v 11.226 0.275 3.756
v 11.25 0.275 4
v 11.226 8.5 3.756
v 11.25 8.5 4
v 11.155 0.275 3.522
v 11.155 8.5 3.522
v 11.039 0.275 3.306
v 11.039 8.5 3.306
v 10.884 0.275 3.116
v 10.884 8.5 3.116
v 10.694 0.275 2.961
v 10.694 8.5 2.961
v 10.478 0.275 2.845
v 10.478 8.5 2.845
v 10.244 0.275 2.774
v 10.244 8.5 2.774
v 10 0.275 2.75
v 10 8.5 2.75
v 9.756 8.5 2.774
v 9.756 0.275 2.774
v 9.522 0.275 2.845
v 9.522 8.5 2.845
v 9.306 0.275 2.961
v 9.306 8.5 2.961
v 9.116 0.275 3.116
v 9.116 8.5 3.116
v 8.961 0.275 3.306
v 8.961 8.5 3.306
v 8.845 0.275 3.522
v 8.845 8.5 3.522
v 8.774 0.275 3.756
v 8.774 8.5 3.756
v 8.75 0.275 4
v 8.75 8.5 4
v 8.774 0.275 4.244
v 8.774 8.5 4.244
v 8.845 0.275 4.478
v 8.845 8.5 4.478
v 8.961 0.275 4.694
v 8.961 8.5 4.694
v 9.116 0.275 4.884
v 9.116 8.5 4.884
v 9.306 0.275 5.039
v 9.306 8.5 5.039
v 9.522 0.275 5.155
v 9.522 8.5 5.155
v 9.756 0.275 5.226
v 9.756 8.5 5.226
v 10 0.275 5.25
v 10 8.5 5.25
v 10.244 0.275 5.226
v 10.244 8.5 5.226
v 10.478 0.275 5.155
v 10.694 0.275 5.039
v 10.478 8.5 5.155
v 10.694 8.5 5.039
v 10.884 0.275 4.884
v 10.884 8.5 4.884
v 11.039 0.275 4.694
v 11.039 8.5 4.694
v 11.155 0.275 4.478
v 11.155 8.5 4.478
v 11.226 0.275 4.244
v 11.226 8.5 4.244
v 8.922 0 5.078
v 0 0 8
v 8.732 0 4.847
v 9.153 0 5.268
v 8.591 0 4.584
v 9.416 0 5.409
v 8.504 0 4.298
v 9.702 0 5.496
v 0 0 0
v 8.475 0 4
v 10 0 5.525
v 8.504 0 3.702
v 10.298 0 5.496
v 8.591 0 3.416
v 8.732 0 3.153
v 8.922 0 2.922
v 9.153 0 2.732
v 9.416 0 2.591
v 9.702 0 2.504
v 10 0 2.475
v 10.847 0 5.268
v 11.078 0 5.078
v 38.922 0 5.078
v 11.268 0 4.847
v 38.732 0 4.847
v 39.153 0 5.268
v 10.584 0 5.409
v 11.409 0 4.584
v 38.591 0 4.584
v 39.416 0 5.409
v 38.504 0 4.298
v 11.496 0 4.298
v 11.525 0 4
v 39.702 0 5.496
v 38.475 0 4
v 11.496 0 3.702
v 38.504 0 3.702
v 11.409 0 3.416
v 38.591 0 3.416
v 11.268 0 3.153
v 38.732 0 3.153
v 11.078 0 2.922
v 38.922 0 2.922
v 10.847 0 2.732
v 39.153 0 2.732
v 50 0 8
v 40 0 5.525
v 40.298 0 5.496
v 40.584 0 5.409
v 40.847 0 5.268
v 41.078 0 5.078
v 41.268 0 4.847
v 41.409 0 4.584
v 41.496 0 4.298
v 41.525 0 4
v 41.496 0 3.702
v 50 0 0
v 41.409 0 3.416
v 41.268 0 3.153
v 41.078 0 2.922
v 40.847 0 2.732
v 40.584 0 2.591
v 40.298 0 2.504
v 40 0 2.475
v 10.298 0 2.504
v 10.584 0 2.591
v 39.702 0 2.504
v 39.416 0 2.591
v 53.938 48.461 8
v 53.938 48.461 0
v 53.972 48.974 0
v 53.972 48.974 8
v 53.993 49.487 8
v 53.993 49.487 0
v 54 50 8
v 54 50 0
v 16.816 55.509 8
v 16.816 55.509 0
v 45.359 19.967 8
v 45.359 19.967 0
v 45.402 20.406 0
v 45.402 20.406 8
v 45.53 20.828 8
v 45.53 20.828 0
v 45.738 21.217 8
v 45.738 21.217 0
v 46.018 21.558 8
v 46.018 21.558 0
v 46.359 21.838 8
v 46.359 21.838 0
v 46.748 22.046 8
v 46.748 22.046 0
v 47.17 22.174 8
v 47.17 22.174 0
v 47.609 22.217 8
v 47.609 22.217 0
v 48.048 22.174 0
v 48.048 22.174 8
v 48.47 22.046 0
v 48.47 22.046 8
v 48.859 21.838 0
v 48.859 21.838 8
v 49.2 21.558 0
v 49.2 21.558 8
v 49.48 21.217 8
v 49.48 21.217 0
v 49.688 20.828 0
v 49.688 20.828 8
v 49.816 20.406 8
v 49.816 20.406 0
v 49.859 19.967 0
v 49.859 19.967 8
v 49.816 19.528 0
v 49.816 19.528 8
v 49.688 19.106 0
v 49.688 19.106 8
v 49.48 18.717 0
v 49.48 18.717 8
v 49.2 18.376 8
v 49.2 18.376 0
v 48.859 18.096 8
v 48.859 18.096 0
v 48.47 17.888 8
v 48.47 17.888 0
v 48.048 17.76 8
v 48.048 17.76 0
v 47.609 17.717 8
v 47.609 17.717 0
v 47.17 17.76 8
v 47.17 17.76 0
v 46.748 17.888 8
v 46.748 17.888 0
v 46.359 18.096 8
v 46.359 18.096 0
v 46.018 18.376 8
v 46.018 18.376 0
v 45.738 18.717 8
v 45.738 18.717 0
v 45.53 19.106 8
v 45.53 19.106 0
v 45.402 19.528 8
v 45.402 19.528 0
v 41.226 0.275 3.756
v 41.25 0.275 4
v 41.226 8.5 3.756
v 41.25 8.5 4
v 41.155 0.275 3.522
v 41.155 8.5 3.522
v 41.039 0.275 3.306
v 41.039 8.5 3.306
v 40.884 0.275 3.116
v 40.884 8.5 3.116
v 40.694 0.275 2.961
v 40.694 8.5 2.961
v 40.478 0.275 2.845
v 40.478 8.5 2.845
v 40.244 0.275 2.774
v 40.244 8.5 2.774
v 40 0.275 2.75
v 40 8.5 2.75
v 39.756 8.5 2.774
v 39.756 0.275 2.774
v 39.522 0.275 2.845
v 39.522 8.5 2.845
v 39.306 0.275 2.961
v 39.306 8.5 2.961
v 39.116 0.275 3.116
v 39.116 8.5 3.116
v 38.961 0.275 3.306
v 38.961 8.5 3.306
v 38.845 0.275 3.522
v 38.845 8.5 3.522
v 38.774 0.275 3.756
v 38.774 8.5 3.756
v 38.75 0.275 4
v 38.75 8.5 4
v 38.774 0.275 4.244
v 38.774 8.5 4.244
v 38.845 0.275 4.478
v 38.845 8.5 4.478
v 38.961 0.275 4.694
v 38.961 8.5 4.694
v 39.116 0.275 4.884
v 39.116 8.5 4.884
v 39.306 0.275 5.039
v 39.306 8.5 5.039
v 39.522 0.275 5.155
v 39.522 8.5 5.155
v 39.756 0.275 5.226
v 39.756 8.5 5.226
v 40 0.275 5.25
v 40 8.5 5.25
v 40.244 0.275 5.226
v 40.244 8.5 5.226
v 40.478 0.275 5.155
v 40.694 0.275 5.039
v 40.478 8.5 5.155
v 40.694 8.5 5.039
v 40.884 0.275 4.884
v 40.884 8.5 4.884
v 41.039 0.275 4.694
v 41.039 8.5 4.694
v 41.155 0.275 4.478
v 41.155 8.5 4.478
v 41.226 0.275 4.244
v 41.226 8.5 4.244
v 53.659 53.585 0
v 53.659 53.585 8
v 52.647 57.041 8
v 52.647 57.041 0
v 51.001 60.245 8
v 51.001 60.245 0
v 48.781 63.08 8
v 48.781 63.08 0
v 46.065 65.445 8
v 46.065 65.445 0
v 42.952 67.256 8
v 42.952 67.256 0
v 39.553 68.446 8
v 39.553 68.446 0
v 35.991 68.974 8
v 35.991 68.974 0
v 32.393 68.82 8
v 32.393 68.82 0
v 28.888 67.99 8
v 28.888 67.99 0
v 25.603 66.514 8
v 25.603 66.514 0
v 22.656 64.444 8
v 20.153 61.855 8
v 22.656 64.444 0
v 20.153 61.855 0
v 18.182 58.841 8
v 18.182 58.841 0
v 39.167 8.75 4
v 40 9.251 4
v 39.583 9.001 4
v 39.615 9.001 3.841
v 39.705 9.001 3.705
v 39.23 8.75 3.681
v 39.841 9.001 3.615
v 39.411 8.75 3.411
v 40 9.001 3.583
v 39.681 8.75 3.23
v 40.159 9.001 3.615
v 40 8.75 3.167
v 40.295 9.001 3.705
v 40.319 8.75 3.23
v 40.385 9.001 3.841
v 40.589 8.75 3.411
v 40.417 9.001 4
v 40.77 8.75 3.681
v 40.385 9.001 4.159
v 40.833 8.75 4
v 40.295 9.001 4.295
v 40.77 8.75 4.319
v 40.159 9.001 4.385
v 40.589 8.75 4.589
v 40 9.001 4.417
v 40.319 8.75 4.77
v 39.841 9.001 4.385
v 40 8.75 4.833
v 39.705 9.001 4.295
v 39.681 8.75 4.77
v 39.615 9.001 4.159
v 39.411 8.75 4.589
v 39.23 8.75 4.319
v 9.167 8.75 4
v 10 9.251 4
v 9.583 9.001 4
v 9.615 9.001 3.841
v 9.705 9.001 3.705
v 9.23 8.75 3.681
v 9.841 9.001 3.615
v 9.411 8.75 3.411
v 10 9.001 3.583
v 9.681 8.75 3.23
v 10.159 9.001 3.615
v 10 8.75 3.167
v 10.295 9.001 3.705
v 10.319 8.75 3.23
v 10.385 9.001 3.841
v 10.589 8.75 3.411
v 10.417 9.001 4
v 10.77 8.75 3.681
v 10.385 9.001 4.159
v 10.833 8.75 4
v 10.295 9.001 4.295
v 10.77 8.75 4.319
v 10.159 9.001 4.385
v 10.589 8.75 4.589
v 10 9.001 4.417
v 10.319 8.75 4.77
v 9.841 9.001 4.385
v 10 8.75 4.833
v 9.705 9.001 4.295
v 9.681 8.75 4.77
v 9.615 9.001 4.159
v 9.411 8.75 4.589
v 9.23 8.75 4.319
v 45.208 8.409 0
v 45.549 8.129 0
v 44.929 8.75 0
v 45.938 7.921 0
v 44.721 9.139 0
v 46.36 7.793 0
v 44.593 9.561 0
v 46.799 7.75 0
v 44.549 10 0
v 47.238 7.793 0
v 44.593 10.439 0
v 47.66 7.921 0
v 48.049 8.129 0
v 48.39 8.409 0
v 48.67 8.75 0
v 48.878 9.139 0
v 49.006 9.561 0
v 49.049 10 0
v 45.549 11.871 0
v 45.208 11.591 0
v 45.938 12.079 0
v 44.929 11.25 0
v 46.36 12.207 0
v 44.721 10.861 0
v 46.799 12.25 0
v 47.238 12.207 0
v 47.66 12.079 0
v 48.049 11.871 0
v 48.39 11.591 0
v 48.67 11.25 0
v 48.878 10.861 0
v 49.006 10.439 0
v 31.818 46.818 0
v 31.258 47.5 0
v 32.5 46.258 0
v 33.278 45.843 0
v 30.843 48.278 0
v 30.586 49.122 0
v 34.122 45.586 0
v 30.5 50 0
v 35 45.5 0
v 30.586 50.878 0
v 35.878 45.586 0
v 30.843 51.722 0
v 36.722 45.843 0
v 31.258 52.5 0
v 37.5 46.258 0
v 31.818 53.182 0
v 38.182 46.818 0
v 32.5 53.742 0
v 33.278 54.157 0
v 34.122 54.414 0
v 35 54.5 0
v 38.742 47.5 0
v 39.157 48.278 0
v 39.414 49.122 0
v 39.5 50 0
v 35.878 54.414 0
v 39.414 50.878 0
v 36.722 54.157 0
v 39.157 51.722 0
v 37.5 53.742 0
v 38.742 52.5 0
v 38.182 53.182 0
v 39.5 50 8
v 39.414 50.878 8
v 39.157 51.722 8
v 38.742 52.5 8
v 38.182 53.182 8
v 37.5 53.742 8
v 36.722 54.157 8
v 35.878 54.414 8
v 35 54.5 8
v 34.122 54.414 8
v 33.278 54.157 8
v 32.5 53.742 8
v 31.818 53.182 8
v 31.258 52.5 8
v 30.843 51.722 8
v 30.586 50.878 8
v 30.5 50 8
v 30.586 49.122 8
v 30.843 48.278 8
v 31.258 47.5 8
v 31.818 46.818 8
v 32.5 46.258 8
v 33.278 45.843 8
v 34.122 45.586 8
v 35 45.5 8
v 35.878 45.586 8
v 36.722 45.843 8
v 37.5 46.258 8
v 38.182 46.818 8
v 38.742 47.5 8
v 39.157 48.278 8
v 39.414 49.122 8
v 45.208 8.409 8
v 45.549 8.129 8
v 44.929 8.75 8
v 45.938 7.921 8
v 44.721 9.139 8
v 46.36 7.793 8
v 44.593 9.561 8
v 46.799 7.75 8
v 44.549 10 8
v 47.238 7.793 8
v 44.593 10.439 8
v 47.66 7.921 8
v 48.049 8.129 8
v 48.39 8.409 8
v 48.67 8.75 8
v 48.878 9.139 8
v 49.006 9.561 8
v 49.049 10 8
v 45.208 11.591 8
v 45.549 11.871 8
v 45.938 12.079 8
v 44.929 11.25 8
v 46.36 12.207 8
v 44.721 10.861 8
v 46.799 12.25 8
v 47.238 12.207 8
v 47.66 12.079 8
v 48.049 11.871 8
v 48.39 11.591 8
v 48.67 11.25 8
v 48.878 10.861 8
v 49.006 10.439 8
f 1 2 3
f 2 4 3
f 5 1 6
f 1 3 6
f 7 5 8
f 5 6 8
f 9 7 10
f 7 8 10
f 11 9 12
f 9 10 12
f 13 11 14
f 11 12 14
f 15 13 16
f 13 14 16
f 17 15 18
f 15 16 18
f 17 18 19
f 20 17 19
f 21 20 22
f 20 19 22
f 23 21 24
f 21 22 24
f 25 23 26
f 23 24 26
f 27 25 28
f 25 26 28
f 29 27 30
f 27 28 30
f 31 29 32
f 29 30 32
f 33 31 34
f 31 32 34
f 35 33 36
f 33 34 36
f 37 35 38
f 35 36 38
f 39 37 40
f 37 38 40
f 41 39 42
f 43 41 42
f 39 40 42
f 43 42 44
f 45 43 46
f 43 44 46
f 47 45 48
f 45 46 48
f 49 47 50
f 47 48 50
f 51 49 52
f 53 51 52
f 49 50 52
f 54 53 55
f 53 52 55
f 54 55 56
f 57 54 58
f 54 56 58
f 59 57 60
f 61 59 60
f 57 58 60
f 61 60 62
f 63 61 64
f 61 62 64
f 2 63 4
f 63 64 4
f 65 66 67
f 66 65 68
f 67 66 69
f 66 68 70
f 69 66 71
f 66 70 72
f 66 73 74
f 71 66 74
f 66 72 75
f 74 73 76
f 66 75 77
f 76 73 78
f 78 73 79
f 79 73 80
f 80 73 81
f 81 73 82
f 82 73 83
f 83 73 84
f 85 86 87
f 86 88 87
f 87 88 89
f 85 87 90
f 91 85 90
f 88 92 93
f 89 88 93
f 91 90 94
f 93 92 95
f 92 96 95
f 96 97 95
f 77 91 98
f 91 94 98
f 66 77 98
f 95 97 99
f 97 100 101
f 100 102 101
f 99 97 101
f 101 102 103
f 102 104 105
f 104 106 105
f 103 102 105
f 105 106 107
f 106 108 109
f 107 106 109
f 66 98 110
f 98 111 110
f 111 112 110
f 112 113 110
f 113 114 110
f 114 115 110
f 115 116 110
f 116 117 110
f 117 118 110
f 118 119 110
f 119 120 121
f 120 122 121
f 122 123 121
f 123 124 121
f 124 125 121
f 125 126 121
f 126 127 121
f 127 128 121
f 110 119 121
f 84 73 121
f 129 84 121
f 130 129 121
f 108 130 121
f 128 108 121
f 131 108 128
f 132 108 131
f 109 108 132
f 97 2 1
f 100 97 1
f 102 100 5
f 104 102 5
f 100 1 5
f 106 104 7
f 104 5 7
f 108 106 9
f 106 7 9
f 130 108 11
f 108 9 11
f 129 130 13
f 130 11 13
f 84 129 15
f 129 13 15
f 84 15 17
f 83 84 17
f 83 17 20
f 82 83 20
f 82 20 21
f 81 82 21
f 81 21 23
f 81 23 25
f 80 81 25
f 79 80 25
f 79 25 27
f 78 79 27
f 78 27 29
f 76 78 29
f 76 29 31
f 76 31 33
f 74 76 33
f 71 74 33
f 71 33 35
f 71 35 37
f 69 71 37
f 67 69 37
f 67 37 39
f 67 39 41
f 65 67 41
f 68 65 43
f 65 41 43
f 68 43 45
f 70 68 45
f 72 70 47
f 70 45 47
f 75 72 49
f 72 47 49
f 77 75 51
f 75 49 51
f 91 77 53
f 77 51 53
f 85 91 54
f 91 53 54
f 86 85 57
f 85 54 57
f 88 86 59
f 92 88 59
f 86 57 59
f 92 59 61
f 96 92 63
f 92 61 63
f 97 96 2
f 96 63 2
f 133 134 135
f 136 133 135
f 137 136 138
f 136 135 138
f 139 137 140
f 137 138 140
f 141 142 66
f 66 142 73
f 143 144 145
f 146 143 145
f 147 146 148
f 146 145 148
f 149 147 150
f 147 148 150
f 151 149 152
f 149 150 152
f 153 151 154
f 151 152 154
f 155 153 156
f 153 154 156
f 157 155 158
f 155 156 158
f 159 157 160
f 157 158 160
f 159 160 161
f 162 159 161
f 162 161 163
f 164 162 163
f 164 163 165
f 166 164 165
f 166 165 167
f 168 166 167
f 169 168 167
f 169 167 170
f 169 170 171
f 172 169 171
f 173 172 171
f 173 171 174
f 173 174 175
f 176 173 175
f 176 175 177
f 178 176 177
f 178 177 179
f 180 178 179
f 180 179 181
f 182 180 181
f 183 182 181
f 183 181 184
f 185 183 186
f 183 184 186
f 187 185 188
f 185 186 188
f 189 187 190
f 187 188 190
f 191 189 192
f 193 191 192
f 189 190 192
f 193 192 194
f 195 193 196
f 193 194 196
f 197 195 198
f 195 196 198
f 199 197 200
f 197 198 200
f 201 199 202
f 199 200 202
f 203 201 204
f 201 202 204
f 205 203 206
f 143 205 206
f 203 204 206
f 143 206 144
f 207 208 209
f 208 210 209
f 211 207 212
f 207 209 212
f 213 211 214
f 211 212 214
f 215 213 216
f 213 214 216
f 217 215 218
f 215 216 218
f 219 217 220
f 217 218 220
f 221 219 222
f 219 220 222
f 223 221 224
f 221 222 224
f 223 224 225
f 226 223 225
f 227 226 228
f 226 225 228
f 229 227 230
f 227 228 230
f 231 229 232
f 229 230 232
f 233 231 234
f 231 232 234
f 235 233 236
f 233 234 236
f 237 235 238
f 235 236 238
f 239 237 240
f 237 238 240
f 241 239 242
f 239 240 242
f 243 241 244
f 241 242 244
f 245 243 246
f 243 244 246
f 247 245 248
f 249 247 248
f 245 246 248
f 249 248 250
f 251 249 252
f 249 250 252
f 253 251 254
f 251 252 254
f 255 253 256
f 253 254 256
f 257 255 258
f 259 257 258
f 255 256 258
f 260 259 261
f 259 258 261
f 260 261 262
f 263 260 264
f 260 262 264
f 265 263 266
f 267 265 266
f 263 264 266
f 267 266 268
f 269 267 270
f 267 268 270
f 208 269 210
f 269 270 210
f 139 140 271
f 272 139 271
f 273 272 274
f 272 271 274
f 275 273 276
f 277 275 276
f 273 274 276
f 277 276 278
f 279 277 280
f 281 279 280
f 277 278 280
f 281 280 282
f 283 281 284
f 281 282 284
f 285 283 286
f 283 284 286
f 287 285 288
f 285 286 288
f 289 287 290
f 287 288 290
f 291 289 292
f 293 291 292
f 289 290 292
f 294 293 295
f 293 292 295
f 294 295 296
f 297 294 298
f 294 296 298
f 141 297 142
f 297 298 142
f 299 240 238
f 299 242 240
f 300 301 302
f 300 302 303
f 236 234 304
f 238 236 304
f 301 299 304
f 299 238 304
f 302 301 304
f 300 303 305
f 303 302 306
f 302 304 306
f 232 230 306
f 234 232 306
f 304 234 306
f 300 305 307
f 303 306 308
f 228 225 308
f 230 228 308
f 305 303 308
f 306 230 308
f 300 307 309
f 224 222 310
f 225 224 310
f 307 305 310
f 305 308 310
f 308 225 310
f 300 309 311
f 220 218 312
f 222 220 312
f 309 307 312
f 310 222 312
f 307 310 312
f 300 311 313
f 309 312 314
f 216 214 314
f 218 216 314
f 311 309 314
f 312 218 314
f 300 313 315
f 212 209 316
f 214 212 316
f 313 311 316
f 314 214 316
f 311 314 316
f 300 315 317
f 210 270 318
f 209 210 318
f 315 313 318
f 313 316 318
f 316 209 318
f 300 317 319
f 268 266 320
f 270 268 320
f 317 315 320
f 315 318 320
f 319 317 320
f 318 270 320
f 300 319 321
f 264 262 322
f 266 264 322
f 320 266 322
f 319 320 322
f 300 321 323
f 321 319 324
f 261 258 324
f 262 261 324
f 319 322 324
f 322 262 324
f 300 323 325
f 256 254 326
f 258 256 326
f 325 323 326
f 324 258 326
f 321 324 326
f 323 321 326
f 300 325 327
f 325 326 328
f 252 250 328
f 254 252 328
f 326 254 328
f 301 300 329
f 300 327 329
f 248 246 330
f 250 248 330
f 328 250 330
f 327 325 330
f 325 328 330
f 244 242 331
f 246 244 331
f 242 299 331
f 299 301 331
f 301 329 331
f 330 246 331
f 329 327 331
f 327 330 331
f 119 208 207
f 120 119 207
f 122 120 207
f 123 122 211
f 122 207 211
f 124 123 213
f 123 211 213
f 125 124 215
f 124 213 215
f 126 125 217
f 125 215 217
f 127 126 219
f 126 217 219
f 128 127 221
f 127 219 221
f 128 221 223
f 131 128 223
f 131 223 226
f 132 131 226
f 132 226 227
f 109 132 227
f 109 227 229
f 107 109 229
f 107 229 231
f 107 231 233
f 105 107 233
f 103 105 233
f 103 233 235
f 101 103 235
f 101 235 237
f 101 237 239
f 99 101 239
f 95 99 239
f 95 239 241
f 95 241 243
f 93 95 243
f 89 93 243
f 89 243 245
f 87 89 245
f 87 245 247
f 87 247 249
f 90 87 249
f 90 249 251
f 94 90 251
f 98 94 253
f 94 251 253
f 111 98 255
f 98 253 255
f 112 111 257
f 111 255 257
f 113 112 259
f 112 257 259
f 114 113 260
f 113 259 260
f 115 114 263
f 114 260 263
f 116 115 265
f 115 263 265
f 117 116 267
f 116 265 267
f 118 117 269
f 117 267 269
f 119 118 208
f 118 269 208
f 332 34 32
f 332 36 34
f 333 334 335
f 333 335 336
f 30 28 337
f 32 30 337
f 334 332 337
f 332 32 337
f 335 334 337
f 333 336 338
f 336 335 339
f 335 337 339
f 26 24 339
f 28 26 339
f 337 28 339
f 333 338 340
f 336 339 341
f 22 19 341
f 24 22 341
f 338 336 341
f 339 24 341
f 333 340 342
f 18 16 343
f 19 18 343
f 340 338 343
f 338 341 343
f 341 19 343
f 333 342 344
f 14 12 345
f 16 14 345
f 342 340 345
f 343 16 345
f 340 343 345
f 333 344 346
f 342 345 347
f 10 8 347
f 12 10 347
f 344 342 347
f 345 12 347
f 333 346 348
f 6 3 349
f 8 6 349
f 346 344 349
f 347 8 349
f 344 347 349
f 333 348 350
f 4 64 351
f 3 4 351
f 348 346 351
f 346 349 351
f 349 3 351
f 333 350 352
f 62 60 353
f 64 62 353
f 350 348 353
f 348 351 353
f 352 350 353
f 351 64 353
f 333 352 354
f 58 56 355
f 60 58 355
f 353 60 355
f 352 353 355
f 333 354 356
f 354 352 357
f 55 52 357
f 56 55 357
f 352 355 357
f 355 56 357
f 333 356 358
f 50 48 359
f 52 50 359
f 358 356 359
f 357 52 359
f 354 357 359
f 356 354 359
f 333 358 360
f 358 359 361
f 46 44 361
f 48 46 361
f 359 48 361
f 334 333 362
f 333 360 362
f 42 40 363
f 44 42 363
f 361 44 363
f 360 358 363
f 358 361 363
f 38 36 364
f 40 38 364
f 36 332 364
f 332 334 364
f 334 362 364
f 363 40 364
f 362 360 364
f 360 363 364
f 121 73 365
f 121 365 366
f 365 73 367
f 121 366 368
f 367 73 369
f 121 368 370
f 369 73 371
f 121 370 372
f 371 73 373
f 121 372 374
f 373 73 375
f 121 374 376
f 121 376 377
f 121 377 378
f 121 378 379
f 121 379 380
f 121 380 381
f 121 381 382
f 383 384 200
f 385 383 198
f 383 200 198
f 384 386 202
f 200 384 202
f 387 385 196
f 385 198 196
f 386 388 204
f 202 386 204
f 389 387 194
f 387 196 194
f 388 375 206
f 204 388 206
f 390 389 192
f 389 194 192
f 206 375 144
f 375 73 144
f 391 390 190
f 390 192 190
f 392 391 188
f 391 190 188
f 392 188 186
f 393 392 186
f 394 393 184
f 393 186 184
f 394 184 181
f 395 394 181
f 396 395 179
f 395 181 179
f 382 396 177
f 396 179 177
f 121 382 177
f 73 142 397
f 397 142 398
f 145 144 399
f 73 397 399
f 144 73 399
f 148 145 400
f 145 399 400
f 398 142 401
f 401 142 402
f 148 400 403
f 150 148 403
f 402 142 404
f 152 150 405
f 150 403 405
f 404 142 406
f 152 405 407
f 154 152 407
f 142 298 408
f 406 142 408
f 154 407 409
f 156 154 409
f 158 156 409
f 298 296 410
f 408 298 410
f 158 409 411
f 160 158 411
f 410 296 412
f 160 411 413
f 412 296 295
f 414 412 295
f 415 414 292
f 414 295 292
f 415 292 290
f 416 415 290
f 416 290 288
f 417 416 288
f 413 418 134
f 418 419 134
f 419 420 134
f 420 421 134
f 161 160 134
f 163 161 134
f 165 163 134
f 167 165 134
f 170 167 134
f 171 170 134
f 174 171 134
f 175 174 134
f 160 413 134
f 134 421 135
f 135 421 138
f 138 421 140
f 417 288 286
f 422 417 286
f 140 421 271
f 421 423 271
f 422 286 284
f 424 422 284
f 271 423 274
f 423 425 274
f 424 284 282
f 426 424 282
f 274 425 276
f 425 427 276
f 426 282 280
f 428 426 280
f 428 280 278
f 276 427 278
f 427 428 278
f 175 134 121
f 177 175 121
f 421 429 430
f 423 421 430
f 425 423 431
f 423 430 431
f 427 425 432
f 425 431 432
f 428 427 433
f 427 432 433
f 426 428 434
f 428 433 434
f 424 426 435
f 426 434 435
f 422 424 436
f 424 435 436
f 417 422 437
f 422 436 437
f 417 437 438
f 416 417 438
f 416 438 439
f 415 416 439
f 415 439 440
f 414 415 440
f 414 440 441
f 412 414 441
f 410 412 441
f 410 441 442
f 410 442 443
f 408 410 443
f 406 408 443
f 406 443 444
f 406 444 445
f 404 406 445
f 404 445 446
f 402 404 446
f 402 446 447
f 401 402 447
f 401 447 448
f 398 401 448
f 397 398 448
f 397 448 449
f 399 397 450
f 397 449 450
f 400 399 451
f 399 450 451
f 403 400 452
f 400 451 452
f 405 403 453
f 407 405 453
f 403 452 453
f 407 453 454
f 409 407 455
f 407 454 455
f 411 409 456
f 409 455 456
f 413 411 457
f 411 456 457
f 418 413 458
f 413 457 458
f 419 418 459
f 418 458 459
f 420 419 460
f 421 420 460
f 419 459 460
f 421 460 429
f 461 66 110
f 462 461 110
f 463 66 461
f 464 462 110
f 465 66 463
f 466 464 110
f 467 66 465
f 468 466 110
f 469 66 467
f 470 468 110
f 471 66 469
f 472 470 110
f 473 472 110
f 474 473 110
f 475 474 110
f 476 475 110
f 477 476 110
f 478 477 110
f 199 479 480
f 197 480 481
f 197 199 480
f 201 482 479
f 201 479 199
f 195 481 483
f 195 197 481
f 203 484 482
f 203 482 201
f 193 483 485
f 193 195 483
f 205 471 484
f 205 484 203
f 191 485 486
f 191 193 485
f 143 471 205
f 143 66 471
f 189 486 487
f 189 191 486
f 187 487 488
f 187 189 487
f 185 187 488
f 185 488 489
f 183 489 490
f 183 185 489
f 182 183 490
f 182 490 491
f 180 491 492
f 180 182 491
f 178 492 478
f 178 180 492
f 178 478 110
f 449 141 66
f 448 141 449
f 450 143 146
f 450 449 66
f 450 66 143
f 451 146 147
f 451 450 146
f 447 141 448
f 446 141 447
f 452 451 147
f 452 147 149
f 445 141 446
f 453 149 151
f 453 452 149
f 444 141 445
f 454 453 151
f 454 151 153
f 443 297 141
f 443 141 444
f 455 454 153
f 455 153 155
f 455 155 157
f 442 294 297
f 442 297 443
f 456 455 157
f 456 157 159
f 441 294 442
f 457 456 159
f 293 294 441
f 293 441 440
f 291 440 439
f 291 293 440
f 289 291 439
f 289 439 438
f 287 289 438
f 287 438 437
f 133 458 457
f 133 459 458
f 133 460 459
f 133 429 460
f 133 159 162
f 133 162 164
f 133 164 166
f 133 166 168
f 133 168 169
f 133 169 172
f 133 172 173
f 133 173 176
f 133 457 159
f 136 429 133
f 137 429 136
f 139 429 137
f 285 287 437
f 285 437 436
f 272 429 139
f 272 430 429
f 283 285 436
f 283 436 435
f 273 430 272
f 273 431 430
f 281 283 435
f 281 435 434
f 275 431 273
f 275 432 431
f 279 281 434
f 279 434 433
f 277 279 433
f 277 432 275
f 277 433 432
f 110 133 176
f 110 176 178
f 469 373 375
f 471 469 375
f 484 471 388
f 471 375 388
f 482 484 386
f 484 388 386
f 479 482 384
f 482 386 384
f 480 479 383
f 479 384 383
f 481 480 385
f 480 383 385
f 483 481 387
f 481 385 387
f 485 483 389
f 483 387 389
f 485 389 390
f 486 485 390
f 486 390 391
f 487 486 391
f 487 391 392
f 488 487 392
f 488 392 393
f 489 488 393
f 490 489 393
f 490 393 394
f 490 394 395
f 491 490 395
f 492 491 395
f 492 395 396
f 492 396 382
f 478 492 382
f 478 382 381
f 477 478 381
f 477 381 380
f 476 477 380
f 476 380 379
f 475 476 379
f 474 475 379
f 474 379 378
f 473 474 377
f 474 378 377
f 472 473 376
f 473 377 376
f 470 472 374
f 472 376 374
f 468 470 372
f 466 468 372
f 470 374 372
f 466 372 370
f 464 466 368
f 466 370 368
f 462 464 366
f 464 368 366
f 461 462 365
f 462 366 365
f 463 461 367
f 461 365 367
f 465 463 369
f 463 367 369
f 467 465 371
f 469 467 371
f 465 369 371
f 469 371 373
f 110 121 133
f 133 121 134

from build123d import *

# Parameters (mm, degrees)
EXTRUDE_1_DEPTH              = 8
HOLE_WIZARD_M4_1_D           = 4.5
HOLE_WIZARD_M3_1_D           = 2.5
HOLE_WIZARD_M3_1_DEPTH       = 8.5
HOLE_WIZARD_M3_1_CSINK_D     = 3.05
HOLE_WIZARD_M3_1_CSINK_ANGLE = 90
HOLE_WIZARD_M3_1_TIP         = 0.751075774
HOLE_WIZARD_M8_1_D           = 9


with BuildPart() as part:
    # 스케치1 → 보스-돌출1 (new body)
    with BuildSketch(Plane.XY):
        with BuildLine():
            Line((16.816107383, 55.508724832), (0, 0))
            Line((0, 0), (50, 0))
            Line((50, 0), (53.937590447, 48.461277134))
            ThreePointArc((53.937590447, 48.461277134), (31.456182162, 31.333416083), (16.816107383, 55.508724832))
        make_face()
        with BuildLine():
            ThreePointArc((54, 50), (37.784424561, 68.794865785), (16.816107383, 55.508724832))
            ThreePointArc((16.816107383, 55.508724832), (31.456182162, 31.333416083), (53.937590447, 48.461277134))
            ThreePointArc((53.937590447, 48.461277134), (53.9843912, 49.230006005), (54, 50))
        make_face()
    extrude(amount=EXTRUDE_1_DEPTH)

    # M4 여유 구멍1 (through all)
    with Locations(Plane.XY.offset(8)):
        with Locations((46.799340892, 10), (47.609195032, 19.967152867)):
            Hole(HOLE_WIZARD_M4_1_D / 2)

    # M3 나사 구멍1
    with Locations(Plane(origin=(0, 0, 0), x_dir=(-1, 0, 0), z_dir=(0, -1, 0))):
        with Locations((-10, -4), (-40, -4)):
            CounterSinkHole(HOLE_WIZARD_M3_1_D / 2, HOLE_WIZARD_M3_1_CSINK_D / 2, depth=HOLE_WIZARD_M3_1_DEPTH, counter_sink_angle=HOLE_WIZARD_M3_1_CSINK_ANGLE)
            with Locations((0, 0, -(HOLE_WIZARD_M3_1_DEPTH + HOLE_WIZARD_M3_1_TIP / 2))):  # 118° drill point
                Cone(0, HOLE_WIZARD_M3_1_D / 2, HOLE_WIZARD_M3_1_TIP, mode=Mode.SUBTRACT)

    # M8 여유 구멍1 (through all)
    with Locations(Plane(origin=(0, 0, 0), x_dir=(-1, 0, 0), z_dir=(0, 0, -1))):
        with Locations((-35, 50)):
            Hole(HOLE_WIZARD_M8_1_D / 2)


solid = part.part
